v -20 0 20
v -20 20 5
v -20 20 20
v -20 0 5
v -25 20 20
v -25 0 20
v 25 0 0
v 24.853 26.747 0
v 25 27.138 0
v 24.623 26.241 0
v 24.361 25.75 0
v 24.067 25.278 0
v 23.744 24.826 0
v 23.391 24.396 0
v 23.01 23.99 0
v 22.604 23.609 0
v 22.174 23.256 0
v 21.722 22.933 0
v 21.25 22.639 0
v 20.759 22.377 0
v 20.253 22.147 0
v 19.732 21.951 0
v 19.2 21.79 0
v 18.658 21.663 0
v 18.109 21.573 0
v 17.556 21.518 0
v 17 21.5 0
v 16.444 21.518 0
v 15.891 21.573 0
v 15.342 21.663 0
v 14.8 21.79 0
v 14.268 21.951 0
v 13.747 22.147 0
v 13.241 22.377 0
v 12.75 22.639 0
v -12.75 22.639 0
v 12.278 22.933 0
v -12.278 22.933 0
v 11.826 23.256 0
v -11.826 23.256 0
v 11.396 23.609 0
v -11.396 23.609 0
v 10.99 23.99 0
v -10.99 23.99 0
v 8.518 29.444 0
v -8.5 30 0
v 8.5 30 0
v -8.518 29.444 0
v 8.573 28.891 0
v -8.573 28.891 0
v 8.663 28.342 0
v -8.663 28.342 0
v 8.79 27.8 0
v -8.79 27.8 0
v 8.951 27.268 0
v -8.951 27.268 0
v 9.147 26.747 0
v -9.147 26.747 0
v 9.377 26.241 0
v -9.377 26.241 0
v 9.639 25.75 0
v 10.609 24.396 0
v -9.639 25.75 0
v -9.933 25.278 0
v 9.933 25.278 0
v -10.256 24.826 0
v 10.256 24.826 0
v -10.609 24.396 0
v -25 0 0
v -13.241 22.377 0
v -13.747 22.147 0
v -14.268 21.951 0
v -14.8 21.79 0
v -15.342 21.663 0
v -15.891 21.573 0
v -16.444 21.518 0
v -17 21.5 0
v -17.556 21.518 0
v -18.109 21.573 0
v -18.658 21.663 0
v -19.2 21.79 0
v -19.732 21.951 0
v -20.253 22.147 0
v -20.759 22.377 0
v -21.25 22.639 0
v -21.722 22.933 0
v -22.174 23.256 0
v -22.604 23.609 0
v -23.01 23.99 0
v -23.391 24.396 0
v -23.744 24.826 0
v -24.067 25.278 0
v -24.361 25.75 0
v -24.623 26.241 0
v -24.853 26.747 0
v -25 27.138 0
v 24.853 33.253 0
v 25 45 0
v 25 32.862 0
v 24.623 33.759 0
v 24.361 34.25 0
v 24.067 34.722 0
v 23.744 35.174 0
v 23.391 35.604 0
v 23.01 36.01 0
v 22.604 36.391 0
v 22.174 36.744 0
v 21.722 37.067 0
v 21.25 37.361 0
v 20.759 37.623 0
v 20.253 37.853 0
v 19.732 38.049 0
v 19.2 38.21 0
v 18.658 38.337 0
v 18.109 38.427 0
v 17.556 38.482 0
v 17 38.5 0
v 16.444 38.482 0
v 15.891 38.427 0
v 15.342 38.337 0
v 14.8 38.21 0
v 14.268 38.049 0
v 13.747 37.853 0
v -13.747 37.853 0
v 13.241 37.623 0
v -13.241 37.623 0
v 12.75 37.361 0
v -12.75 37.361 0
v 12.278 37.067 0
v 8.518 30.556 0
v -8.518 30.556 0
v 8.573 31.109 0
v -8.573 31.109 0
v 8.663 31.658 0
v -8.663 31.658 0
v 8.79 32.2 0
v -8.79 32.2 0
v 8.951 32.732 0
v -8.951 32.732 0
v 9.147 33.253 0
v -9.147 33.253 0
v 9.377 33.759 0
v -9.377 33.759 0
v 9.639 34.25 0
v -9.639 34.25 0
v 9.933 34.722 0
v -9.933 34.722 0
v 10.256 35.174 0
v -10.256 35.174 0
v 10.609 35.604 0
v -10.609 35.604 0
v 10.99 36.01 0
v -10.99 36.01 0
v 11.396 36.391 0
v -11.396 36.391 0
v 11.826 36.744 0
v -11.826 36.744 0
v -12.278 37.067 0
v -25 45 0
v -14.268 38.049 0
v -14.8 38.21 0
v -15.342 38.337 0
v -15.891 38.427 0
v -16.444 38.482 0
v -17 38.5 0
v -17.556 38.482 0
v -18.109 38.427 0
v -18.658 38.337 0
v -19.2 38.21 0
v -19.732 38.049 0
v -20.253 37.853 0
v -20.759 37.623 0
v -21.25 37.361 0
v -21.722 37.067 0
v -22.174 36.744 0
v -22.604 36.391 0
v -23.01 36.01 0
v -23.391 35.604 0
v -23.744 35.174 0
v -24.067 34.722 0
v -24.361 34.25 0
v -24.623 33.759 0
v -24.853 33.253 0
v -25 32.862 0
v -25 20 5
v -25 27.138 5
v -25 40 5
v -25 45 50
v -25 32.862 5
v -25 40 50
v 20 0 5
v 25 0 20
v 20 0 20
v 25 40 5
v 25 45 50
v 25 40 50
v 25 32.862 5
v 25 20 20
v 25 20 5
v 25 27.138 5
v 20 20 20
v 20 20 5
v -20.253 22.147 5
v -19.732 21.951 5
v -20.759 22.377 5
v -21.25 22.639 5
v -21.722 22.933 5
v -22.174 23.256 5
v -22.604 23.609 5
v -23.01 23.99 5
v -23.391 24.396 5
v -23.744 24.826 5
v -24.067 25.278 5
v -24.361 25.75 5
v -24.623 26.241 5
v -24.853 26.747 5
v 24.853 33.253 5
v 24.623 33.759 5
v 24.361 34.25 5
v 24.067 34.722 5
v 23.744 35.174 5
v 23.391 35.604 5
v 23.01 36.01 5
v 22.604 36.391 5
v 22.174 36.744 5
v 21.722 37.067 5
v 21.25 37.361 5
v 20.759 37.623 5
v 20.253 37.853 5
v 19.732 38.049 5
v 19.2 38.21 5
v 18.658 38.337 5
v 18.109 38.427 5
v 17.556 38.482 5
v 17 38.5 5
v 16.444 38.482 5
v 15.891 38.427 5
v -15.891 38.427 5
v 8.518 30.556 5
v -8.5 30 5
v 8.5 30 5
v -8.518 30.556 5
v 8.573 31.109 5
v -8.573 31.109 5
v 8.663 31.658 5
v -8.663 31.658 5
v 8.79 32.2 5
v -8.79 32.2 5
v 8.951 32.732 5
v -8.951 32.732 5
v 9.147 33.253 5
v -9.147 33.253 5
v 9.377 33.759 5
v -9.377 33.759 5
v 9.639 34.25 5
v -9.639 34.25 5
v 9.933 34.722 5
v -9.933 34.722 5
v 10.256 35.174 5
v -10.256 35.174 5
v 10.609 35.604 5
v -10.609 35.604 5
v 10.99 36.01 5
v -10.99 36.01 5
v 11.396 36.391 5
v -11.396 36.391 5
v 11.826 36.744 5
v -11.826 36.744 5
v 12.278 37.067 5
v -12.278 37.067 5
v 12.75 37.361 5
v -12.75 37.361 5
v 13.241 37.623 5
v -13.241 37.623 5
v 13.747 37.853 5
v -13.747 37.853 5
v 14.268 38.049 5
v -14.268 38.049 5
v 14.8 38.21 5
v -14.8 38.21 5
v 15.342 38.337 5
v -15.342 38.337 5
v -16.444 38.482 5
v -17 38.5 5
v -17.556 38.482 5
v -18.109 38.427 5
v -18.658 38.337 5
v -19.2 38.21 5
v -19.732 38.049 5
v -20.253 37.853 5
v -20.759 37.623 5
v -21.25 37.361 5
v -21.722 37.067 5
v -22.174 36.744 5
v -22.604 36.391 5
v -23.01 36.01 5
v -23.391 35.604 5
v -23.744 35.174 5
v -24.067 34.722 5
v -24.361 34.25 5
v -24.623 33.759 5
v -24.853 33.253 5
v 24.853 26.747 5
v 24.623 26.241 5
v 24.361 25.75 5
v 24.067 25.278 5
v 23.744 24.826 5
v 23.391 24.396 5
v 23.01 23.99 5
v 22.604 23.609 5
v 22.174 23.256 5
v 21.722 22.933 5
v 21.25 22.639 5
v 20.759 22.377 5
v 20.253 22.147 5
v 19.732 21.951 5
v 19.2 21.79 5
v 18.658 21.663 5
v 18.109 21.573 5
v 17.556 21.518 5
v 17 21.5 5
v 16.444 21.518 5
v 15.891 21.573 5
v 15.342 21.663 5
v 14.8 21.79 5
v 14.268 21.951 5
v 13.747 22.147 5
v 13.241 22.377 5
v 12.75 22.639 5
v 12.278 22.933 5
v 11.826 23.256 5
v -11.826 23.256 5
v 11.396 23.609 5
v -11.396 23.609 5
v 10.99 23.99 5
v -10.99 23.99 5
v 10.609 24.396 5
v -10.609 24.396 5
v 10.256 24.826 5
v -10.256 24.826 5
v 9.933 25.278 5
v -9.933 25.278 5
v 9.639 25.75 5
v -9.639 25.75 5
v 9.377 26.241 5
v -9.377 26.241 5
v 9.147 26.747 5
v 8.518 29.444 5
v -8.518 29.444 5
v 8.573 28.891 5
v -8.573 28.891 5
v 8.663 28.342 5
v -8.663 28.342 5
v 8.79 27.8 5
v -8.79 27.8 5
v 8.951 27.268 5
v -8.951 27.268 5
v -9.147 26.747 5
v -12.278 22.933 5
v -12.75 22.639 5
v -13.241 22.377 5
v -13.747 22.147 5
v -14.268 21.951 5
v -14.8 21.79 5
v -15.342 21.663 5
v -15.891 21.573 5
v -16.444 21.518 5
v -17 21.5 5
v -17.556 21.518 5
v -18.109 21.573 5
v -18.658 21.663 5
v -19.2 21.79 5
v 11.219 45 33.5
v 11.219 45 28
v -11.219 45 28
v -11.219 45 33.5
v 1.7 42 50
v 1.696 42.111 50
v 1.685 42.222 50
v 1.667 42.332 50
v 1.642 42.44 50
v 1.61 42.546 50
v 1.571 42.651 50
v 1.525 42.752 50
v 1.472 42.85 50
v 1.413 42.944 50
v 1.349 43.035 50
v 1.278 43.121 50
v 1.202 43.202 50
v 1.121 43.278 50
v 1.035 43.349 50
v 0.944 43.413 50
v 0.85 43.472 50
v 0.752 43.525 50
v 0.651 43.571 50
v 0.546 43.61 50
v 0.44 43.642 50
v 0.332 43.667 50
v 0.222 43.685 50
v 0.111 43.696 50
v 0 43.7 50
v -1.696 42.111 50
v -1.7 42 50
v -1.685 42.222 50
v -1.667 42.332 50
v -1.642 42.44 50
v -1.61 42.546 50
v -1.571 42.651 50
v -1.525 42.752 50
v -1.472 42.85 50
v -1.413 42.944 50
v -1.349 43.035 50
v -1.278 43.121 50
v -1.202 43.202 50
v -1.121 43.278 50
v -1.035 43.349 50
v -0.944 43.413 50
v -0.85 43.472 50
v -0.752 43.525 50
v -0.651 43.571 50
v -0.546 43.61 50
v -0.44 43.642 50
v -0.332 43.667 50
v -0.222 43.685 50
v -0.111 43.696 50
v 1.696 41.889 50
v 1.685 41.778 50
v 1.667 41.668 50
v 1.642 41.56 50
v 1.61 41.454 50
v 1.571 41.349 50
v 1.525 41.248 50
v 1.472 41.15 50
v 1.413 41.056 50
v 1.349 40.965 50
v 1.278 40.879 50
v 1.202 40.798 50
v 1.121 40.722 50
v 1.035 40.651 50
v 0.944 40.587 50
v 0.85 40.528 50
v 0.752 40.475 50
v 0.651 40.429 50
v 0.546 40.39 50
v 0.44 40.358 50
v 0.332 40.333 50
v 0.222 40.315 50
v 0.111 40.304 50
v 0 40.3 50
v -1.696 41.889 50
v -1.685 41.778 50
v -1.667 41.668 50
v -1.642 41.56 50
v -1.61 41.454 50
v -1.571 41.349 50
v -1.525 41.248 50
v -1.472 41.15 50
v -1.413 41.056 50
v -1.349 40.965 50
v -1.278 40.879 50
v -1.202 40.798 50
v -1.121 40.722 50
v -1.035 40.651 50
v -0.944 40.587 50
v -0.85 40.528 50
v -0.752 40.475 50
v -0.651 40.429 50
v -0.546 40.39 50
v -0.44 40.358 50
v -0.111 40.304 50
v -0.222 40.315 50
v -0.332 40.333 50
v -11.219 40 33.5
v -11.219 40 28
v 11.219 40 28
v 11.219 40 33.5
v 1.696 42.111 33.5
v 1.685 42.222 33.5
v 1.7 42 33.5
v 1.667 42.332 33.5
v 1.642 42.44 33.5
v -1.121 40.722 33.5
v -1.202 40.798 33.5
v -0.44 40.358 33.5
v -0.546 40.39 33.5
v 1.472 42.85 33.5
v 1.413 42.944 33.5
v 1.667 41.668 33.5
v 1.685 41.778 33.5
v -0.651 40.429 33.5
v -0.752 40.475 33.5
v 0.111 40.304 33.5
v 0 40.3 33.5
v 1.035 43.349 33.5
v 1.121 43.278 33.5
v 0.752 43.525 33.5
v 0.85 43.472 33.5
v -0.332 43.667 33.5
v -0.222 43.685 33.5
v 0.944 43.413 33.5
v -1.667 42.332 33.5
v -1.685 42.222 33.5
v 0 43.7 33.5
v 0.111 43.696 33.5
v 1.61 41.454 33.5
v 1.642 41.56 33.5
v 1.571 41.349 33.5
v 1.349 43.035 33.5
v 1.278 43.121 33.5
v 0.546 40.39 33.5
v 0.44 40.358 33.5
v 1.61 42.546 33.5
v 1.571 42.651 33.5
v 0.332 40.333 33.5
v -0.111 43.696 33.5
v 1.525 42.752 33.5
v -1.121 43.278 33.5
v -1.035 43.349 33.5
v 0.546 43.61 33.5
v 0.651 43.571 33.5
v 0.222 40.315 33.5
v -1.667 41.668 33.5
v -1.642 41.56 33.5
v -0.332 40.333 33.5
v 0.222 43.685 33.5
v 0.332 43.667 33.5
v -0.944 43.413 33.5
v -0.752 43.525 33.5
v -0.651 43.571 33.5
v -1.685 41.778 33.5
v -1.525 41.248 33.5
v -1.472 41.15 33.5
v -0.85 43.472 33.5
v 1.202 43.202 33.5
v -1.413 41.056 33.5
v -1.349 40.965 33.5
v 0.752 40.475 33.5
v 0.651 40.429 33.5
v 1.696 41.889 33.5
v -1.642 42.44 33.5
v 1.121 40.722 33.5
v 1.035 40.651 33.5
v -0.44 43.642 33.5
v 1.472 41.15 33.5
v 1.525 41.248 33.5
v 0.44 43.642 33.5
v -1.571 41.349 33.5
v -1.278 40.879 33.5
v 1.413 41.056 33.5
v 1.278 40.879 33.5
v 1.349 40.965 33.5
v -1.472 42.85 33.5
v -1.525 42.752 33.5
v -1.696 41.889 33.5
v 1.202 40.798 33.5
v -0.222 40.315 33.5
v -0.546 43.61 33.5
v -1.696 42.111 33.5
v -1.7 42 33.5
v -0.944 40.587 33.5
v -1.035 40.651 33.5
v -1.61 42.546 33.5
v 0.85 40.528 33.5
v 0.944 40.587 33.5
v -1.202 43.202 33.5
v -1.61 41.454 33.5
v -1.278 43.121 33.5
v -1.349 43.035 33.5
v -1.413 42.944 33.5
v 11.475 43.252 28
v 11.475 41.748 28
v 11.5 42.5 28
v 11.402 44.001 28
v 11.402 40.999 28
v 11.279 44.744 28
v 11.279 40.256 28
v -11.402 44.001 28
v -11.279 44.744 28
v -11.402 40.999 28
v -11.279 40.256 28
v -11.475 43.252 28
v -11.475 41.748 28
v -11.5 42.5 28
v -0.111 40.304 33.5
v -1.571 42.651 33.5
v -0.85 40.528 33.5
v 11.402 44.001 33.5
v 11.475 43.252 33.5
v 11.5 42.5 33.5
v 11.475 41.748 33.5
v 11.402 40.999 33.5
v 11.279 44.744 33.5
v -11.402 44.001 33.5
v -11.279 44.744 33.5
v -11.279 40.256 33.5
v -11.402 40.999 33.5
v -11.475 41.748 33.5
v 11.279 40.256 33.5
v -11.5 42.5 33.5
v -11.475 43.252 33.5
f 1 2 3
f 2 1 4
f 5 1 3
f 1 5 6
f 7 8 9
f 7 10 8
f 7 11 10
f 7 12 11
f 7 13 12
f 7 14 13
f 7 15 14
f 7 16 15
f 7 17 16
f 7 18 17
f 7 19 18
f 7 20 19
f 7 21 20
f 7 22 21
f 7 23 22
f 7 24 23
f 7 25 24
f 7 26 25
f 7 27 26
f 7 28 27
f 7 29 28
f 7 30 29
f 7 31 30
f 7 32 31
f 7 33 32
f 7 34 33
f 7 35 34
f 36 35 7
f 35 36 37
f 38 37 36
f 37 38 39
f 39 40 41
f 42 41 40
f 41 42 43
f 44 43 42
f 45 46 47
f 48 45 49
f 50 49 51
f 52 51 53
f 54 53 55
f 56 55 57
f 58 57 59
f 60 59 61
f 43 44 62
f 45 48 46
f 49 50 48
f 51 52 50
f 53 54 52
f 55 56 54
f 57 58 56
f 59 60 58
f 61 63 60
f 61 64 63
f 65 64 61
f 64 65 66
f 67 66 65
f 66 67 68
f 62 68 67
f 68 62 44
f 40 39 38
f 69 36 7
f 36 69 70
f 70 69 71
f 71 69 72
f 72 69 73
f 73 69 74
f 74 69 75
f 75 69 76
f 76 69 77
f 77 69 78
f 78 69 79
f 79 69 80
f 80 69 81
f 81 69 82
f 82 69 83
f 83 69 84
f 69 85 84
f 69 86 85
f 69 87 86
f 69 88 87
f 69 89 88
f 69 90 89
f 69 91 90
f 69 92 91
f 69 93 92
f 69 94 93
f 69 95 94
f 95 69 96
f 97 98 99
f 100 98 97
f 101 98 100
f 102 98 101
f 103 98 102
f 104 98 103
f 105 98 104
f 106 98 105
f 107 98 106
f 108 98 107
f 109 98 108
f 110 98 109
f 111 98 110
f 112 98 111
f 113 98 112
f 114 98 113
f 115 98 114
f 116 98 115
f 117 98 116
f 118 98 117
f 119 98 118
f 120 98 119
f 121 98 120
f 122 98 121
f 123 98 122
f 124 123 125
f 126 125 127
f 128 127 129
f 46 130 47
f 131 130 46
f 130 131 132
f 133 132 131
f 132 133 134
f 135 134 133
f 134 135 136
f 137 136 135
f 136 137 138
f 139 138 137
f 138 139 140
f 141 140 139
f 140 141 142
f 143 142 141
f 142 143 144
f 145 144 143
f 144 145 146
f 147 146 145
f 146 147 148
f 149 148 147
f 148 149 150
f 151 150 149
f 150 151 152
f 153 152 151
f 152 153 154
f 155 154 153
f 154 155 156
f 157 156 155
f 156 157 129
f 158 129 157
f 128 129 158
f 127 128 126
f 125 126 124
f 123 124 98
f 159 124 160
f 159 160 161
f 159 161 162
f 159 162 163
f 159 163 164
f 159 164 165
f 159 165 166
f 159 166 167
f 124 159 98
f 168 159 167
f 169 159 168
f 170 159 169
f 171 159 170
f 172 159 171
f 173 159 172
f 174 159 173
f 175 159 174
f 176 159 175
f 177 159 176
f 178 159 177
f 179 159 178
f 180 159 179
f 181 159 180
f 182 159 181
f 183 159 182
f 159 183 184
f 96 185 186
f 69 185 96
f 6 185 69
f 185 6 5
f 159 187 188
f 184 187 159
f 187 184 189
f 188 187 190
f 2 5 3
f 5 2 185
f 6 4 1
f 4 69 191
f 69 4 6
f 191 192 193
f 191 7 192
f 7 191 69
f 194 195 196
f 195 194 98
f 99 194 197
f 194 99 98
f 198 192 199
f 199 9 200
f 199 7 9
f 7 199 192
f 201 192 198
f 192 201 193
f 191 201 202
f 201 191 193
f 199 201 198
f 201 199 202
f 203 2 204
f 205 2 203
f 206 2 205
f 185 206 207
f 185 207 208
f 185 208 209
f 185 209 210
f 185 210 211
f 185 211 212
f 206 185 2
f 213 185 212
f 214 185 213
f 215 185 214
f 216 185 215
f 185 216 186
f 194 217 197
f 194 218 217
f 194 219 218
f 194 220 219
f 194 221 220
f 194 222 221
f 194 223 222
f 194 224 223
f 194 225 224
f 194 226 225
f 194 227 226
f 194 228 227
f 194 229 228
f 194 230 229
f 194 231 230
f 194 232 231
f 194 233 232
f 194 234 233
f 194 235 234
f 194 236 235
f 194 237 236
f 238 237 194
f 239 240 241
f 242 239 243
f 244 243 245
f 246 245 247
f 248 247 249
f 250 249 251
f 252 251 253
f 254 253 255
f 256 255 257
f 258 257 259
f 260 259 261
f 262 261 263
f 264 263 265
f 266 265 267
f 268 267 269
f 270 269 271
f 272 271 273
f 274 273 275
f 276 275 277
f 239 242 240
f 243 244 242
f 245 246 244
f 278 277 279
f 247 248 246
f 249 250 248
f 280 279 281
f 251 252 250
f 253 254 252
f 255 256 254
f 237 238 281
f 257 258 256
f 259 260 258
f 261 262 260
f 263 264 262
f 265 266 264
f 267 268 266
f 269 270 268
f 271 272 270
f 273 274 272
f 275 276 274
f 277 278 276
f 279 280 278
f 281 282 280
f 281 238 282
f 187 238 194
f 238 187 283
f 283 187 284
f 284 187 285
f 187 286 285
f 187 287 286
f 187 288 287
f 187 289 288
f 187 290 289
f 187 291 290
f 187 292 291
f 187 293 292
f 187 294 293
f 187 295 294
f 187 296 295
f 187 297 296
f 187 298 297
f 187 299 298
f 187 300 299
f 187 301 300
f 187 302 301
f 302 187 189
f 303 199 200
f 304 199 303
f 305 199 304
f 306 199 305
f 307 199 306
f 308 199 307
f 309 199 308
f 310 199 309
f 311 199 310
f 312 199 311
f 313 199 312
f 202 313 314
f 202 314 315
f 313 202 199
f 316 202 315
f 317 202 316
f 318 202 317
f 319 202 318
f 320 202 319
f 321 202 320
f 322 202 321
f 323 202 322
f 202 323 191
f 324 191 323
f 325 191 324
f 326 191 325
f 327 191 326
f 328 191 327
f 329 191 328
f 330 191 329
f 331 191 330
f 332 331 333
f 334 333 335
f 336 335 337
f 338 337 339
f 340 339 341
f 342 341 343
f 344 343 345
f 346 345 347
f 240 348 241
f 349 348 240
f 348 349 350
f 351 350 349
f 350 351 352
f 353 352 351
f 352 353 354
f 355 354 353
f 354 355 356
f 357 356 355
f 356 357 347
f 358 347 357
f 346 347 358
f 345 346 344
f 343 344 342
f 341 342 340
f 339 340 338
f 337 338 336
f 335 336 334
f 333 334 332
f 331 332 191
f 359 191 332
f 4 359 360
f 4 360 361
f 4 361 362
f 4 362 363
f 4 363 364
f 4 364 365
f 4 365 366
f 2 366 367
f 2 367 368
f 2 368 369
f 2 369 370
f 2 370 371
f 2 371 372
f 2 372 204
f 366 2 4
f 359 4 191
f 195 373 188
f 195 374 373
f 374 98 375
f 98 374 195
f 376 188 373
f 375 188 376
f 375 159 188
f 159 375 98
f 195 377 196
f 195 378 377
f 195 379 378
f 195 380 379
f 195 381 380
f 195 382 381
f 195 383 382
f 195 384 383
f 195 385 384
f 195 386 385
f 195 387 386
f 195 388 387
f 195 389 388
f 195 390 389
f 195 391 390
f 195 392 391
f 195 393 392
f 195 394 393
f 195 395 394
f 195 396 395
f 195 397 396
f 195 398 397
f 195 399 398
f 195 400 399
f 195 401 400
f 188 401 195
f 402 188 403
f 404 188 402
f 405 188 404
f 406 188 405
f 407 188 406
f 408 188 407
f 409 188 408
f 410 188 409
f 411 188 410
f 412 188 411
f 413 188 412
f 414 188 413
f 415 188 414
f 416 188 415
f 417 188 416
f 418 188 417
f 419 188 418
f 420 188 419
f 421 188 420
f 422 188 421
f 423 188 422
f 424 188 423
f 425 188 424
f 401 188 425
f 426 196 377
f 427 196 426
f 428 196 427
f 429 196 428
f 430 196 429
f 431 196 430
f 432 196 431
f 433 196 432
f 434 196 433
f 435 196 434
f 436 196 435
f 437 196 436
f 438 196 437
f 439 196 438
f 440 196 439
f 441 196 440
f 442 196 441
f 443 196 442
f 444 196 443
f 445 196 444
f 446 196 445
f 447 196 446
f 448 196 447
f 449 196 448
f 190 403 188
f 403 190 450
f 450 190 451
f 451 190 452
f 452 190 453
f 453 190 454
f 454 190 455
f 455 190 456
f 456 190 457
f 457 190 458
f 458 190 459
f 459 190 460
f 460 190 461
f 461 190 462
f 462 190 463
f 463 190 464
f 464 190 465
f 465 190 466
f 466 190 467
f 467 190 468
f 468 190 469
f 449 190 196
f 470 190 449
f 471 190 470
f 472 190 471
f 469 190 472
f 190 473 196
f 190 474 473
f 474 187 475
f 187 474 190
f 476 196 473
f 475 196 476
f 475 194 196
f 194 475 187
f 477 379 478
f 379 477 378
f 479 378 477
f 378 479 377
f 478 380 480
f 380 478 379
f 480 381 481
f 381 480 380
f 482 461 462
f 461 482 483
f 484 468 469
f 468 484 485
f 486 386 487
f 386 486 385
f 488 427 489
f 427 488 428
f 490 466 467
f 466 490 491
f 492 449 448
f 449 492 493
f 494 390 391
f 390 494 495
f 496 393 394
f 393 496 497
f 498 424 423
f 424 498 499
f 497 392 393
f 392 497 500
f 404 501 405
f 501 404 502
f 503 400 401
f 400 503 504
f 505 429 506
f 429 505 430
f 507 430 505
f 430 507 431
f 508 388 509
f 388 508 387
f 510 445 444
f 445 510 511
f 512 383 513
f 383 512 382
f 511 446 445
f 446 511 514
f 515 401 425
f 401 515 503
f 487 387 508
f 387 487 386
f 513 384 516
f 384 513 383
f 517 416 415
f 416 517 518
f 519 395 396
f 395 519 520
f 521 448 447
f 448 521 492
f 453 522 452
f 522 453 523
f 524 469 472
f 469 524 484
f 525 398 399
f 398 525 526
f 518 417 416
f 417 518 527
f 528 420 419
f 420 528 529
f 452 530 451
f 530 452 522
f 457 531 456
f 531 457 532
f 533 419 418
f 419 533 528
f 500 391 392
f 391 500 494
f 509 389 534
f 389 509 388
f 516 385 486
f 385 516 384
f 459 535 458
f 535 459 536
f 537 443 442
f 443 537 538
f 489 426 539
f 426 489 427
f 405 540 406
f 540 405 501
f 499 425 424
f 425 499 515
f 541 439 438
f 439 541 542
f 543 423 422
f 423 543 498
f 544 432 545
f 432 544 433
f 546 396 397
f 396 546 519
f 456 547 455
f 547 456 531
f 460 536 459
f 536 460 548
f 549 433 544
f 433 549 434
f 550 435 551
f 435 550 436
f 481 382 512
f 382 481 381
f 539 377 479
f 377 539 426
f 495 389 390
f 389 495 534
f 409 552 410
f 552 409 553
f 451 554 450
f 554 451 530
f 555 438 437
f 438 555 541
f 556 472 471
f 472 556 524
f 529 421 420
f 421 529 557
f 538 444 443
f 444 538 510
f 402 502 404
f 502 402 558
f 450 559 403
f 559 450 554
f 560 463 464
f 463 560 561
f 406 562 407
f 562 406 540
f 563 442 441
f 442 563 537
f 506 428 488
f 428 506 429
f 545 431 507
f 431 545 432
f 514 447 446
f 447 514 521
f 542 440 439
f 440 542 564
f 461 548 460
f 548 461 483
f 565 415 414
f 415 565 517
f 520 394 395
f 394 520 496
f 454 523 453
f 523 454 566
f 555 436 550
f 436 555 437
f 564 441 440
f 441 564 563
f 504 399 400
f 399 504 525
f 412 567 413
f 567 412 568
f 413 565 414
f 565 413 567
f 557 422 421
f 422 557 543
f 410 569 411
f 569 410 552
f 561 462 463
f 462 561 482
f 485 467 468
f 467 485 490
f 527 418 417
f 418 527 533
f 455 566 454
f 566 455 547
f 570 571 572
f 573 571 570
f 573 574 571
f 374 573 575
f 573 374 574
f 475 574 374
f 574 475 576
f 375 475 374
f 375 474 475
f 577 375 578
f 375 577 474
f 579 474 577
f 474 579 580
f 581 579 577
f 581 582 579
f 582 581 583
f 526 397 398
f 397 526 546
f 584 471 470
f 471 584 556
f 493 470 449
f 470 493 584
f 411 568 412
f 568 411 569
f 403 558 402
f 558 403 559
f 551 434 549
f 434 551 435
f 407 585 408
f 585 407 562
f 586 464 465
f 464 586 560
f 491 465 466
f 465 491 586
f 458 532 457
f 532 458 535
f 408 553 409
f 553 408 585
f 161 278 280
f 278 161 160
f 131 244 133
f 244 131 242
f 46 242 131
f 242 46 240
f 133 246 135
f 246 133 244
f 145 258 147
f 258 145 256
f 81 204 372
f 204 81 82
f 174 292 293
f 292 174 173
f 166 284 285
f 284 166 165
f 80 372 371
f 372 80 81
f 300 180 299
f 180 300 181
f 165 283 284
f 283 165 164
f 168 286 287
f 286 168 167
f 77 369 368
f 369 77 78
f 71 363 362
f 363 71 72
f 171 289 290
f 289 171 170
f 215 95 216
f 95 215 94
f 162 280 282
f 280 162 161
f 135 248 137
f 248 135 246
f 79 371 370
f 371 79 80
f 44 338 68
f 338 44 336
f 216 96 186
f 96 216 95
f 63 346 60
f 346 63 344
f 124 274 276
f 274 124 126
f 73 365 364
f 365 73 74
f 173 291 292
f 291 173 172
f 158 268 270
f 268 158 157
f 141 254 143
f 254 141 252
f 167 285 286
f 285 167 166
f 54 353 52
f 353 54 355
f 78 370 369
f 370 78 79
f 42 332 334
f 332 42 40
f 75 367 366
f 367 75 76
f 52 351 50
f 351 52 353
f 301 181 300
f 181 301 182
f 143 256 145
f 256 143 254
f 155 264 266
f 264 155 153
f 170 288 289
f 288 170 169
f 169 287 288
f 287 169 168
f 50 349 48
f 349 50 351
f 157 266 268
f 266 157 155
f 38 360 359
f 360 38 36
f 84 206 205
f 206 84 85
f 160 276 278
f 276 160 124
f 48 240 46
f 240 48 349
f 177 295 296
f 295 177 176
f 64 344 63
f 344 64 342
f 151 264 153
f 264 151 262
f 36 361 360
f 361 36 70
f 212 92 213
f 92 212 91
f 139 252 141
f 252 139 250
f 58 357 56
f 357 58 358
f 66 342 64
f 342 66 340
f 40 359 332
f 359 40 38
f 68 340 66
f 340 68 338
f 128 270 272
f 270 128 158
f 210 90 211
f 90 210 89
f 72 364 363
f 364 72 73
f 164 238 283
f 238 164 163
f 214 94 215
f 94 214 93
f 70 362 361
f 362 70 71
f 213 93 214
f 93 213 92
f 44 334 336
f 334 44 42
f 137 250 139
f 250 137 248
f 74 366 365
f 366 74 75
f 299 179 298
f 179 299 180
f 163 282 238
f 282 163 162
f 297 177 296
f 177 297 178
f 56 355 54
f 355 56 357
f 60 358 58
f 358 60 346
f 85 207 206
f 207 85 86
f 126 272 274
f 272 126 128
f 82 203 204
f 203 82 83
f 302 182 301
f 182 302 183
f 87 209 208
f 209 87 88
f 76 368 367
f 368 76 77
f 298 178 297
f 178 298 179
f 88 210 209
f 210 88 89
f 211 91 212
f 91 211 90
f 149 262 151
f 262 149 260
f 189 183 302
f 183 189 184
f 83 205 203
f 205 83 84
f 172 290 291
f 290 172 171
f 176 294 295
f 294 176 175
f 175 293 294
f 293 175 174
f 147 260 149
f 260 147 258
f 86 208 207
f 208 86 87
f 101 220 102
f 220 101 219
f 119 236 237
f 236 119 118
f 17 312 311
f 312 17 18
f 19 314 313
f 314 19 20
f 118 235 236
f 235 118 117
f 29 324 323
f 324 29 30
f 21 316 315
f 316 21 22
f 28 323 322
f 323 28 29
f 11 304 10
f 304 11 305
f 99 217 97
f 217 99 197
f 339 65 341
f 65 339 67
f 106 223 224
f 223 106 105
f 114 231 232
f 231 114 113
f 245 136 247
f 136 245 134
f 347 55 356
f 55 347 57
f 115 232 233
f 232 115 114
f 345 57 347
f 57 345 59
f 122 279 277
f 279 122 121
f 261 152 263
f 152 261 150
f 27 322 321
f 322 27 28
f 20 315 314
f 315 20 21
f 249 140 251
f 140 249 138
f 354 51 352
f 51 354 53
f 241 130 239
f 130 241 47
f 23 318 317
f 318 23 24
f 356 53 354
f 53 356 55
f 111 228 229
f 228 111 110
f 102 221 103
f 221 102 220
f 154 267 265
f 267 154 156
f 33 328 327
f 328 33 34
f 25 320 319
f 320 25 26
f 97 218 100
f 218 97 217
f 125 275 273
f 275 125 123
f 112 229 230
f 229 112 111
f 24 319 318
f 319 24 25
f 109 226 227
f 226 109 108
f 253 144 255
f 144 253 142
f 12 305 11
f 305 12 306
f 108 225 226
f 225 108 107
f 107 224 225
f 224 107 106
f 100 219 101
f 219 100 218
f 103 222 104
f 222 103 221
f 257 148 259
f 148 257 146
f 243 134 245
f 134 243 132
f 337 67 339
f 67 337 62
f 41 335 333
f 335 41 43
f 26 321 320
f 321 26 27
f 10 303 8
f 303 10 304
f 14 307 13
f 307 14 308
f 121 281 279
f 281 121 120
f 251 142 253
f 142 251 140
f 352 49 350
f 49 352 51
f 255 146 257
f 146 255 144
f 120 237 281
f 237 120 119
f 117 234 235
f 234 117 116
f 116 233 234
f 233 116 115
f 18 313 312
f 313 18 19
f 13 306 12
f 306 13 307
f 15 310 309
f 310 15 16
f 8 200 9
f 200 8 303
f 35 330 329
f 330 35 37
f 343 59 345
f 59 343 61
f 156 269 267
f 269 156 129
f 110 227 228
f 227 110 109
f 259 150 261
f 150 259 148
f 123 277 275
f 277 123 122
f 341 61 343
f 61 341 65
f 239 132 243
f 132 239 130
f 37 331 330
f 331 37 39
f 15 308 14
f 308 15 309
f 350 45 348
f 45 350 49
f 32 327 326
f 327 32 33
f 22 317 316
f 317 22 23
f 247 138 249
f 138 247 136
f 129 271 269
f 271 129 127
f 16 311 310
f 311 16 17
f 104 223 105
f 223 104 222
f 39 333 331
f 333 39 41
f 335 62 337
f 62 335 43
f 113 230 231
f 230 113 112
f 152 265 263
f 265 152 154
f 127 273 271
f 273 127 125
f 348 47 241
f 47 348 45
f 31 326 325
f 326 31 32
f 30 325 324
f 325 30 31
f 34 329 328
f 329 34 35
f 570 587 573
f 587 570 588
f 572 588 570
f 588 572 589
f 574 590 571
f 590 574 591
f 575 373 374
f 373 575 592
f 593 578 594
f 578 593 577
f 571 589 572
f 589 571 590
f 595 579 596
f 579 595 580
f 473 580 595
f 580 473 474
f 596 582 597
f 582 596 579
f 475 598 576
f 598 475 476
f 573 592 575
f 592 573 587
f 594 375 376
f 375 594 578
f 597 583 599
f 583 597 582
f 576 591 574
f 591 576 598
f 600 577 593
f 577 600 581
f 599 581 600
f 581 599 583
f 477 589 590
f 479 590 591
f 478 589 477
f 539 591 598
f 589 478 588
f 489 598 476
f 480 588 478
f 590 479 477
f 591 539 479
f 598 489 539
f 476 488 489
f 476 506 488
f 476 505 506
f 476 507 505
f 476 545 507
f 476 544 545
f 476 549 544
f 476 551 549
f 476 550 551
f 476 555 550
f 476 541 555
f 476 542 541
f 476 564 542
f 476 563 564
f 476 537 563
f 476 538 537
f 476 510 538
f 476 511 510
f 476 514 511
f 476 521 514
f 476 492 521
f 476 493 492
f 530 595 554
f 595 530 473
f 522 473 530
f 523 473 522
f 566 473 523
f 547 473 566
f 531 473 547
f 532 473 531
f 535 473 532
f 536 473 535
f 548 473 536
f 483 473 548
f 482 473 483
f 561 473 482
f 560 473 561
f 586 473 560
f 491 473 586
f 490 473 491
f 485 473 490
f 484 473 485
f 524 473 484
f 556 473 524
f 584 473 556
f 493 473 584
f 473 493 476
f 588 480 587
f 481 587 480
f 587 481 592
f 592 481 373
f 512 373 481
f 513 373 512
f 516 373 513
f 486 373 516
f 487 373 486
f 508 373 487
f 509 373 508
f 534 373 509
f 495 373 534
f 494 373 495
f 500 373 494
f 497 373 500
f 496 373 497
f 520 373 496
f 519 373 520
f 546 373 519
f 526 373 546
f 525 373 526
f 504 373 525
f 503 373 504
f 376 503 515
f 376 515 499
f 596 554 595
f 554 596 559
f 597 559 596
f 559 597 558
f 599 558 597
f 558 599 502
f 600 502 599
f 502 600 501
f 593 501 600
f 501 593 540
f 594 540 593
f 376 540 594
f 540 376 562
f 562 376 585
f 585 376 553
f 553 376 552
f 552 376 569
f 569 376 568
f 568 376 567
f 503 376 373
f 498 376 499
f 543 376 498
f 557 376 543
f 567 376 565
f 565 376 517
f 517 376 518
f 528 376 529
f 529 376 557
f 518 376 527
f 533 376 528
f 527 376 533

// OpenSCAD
// NEMA 17 stepper motor L-shaped mounting bracket
// Print orientation: base plate on the bed, vertical plate builds upward (+Z)

// ---------------- Parameters ----------------
plate_x      = 25;     // base plate half-length in X (total 50 mm)
plate_y      = 45;     // base plate length in Y
plate_t      = 5;      // base plate thickness in Z

hole_m4_x    = 17;     // M4 hole centre offset from origin in X (both + and -)
hole_m4_y    = 30;     // M4 hole centre in Y

plate_z      = 50;     // vertical motor plate height in Z
plate_yt     = 5;      // vertical plate thickness in Y

boss_d       = 23;     // motor centring boss hole diameter
boss_x       = 0;      // boss hole centre in X
boss_z       = 28;     // boss hole centre in Z

screw_d      = 3.4;    // M3 screw hole diameter
screw_pitch  = 31;     // M3 screw hole square pattern size (centred on boss)

gusset_t     = 5;      // gusset thickness along X
gusset_y     = 20;     // gusset leg along +Y
gusset_z     = 20;     // gusset leg along +Z

eps          = 0.5;    // cutter overshoot past faces

$fn = 96;

// ---------------- Model ----------------
difference() {
    union() {
        // Base plate
        translate([-plate_x, 0, 0])
            cube([plate_x * 2, plate_y, plate_t]);

        // Vertical motor plate (stands on back edge of base)
        translate([-plate_x, plate_y - plate_yt, 0])
            cube([plate_x * 2, plate_yt, plate_z]);

        // Gussets, flush with left and right edges
        for (sx = [-1, 1])
            translate([sx > 0 ? plate_x - gusset_t : -plate_x, 0, 0])
                cube([gusset_t, gusset_y, gusset_z]);
    }

    // Through-holes
    translate([-hole_m4_x, hole_m4_y, -eps])
        cylinder(d = hole_m4_x, h = plate_t + 2 * eps);

    translate([hole_m4_x, hole_m4_y, -eps])
        cylinder(d = hole_m4_x, h = plate_t + 2 * eps);

    // Motor centring boss hole (along Y)
    translate([boss_x, plate_y - plate_yt / 2, boss_z])
        cylinder(d = boss_d, h = plate_yt + eps);

    // M3 screw holes on square pattern, centred on boss hole
    for (i = [0 : 3])
        rotate([0, 90 * i, 0])
            translate([boss_x, plate_y - plate_yt / 2 - eps, boss_z])
                cylinder(d = screw_d, h = plate_z + eps);
}
